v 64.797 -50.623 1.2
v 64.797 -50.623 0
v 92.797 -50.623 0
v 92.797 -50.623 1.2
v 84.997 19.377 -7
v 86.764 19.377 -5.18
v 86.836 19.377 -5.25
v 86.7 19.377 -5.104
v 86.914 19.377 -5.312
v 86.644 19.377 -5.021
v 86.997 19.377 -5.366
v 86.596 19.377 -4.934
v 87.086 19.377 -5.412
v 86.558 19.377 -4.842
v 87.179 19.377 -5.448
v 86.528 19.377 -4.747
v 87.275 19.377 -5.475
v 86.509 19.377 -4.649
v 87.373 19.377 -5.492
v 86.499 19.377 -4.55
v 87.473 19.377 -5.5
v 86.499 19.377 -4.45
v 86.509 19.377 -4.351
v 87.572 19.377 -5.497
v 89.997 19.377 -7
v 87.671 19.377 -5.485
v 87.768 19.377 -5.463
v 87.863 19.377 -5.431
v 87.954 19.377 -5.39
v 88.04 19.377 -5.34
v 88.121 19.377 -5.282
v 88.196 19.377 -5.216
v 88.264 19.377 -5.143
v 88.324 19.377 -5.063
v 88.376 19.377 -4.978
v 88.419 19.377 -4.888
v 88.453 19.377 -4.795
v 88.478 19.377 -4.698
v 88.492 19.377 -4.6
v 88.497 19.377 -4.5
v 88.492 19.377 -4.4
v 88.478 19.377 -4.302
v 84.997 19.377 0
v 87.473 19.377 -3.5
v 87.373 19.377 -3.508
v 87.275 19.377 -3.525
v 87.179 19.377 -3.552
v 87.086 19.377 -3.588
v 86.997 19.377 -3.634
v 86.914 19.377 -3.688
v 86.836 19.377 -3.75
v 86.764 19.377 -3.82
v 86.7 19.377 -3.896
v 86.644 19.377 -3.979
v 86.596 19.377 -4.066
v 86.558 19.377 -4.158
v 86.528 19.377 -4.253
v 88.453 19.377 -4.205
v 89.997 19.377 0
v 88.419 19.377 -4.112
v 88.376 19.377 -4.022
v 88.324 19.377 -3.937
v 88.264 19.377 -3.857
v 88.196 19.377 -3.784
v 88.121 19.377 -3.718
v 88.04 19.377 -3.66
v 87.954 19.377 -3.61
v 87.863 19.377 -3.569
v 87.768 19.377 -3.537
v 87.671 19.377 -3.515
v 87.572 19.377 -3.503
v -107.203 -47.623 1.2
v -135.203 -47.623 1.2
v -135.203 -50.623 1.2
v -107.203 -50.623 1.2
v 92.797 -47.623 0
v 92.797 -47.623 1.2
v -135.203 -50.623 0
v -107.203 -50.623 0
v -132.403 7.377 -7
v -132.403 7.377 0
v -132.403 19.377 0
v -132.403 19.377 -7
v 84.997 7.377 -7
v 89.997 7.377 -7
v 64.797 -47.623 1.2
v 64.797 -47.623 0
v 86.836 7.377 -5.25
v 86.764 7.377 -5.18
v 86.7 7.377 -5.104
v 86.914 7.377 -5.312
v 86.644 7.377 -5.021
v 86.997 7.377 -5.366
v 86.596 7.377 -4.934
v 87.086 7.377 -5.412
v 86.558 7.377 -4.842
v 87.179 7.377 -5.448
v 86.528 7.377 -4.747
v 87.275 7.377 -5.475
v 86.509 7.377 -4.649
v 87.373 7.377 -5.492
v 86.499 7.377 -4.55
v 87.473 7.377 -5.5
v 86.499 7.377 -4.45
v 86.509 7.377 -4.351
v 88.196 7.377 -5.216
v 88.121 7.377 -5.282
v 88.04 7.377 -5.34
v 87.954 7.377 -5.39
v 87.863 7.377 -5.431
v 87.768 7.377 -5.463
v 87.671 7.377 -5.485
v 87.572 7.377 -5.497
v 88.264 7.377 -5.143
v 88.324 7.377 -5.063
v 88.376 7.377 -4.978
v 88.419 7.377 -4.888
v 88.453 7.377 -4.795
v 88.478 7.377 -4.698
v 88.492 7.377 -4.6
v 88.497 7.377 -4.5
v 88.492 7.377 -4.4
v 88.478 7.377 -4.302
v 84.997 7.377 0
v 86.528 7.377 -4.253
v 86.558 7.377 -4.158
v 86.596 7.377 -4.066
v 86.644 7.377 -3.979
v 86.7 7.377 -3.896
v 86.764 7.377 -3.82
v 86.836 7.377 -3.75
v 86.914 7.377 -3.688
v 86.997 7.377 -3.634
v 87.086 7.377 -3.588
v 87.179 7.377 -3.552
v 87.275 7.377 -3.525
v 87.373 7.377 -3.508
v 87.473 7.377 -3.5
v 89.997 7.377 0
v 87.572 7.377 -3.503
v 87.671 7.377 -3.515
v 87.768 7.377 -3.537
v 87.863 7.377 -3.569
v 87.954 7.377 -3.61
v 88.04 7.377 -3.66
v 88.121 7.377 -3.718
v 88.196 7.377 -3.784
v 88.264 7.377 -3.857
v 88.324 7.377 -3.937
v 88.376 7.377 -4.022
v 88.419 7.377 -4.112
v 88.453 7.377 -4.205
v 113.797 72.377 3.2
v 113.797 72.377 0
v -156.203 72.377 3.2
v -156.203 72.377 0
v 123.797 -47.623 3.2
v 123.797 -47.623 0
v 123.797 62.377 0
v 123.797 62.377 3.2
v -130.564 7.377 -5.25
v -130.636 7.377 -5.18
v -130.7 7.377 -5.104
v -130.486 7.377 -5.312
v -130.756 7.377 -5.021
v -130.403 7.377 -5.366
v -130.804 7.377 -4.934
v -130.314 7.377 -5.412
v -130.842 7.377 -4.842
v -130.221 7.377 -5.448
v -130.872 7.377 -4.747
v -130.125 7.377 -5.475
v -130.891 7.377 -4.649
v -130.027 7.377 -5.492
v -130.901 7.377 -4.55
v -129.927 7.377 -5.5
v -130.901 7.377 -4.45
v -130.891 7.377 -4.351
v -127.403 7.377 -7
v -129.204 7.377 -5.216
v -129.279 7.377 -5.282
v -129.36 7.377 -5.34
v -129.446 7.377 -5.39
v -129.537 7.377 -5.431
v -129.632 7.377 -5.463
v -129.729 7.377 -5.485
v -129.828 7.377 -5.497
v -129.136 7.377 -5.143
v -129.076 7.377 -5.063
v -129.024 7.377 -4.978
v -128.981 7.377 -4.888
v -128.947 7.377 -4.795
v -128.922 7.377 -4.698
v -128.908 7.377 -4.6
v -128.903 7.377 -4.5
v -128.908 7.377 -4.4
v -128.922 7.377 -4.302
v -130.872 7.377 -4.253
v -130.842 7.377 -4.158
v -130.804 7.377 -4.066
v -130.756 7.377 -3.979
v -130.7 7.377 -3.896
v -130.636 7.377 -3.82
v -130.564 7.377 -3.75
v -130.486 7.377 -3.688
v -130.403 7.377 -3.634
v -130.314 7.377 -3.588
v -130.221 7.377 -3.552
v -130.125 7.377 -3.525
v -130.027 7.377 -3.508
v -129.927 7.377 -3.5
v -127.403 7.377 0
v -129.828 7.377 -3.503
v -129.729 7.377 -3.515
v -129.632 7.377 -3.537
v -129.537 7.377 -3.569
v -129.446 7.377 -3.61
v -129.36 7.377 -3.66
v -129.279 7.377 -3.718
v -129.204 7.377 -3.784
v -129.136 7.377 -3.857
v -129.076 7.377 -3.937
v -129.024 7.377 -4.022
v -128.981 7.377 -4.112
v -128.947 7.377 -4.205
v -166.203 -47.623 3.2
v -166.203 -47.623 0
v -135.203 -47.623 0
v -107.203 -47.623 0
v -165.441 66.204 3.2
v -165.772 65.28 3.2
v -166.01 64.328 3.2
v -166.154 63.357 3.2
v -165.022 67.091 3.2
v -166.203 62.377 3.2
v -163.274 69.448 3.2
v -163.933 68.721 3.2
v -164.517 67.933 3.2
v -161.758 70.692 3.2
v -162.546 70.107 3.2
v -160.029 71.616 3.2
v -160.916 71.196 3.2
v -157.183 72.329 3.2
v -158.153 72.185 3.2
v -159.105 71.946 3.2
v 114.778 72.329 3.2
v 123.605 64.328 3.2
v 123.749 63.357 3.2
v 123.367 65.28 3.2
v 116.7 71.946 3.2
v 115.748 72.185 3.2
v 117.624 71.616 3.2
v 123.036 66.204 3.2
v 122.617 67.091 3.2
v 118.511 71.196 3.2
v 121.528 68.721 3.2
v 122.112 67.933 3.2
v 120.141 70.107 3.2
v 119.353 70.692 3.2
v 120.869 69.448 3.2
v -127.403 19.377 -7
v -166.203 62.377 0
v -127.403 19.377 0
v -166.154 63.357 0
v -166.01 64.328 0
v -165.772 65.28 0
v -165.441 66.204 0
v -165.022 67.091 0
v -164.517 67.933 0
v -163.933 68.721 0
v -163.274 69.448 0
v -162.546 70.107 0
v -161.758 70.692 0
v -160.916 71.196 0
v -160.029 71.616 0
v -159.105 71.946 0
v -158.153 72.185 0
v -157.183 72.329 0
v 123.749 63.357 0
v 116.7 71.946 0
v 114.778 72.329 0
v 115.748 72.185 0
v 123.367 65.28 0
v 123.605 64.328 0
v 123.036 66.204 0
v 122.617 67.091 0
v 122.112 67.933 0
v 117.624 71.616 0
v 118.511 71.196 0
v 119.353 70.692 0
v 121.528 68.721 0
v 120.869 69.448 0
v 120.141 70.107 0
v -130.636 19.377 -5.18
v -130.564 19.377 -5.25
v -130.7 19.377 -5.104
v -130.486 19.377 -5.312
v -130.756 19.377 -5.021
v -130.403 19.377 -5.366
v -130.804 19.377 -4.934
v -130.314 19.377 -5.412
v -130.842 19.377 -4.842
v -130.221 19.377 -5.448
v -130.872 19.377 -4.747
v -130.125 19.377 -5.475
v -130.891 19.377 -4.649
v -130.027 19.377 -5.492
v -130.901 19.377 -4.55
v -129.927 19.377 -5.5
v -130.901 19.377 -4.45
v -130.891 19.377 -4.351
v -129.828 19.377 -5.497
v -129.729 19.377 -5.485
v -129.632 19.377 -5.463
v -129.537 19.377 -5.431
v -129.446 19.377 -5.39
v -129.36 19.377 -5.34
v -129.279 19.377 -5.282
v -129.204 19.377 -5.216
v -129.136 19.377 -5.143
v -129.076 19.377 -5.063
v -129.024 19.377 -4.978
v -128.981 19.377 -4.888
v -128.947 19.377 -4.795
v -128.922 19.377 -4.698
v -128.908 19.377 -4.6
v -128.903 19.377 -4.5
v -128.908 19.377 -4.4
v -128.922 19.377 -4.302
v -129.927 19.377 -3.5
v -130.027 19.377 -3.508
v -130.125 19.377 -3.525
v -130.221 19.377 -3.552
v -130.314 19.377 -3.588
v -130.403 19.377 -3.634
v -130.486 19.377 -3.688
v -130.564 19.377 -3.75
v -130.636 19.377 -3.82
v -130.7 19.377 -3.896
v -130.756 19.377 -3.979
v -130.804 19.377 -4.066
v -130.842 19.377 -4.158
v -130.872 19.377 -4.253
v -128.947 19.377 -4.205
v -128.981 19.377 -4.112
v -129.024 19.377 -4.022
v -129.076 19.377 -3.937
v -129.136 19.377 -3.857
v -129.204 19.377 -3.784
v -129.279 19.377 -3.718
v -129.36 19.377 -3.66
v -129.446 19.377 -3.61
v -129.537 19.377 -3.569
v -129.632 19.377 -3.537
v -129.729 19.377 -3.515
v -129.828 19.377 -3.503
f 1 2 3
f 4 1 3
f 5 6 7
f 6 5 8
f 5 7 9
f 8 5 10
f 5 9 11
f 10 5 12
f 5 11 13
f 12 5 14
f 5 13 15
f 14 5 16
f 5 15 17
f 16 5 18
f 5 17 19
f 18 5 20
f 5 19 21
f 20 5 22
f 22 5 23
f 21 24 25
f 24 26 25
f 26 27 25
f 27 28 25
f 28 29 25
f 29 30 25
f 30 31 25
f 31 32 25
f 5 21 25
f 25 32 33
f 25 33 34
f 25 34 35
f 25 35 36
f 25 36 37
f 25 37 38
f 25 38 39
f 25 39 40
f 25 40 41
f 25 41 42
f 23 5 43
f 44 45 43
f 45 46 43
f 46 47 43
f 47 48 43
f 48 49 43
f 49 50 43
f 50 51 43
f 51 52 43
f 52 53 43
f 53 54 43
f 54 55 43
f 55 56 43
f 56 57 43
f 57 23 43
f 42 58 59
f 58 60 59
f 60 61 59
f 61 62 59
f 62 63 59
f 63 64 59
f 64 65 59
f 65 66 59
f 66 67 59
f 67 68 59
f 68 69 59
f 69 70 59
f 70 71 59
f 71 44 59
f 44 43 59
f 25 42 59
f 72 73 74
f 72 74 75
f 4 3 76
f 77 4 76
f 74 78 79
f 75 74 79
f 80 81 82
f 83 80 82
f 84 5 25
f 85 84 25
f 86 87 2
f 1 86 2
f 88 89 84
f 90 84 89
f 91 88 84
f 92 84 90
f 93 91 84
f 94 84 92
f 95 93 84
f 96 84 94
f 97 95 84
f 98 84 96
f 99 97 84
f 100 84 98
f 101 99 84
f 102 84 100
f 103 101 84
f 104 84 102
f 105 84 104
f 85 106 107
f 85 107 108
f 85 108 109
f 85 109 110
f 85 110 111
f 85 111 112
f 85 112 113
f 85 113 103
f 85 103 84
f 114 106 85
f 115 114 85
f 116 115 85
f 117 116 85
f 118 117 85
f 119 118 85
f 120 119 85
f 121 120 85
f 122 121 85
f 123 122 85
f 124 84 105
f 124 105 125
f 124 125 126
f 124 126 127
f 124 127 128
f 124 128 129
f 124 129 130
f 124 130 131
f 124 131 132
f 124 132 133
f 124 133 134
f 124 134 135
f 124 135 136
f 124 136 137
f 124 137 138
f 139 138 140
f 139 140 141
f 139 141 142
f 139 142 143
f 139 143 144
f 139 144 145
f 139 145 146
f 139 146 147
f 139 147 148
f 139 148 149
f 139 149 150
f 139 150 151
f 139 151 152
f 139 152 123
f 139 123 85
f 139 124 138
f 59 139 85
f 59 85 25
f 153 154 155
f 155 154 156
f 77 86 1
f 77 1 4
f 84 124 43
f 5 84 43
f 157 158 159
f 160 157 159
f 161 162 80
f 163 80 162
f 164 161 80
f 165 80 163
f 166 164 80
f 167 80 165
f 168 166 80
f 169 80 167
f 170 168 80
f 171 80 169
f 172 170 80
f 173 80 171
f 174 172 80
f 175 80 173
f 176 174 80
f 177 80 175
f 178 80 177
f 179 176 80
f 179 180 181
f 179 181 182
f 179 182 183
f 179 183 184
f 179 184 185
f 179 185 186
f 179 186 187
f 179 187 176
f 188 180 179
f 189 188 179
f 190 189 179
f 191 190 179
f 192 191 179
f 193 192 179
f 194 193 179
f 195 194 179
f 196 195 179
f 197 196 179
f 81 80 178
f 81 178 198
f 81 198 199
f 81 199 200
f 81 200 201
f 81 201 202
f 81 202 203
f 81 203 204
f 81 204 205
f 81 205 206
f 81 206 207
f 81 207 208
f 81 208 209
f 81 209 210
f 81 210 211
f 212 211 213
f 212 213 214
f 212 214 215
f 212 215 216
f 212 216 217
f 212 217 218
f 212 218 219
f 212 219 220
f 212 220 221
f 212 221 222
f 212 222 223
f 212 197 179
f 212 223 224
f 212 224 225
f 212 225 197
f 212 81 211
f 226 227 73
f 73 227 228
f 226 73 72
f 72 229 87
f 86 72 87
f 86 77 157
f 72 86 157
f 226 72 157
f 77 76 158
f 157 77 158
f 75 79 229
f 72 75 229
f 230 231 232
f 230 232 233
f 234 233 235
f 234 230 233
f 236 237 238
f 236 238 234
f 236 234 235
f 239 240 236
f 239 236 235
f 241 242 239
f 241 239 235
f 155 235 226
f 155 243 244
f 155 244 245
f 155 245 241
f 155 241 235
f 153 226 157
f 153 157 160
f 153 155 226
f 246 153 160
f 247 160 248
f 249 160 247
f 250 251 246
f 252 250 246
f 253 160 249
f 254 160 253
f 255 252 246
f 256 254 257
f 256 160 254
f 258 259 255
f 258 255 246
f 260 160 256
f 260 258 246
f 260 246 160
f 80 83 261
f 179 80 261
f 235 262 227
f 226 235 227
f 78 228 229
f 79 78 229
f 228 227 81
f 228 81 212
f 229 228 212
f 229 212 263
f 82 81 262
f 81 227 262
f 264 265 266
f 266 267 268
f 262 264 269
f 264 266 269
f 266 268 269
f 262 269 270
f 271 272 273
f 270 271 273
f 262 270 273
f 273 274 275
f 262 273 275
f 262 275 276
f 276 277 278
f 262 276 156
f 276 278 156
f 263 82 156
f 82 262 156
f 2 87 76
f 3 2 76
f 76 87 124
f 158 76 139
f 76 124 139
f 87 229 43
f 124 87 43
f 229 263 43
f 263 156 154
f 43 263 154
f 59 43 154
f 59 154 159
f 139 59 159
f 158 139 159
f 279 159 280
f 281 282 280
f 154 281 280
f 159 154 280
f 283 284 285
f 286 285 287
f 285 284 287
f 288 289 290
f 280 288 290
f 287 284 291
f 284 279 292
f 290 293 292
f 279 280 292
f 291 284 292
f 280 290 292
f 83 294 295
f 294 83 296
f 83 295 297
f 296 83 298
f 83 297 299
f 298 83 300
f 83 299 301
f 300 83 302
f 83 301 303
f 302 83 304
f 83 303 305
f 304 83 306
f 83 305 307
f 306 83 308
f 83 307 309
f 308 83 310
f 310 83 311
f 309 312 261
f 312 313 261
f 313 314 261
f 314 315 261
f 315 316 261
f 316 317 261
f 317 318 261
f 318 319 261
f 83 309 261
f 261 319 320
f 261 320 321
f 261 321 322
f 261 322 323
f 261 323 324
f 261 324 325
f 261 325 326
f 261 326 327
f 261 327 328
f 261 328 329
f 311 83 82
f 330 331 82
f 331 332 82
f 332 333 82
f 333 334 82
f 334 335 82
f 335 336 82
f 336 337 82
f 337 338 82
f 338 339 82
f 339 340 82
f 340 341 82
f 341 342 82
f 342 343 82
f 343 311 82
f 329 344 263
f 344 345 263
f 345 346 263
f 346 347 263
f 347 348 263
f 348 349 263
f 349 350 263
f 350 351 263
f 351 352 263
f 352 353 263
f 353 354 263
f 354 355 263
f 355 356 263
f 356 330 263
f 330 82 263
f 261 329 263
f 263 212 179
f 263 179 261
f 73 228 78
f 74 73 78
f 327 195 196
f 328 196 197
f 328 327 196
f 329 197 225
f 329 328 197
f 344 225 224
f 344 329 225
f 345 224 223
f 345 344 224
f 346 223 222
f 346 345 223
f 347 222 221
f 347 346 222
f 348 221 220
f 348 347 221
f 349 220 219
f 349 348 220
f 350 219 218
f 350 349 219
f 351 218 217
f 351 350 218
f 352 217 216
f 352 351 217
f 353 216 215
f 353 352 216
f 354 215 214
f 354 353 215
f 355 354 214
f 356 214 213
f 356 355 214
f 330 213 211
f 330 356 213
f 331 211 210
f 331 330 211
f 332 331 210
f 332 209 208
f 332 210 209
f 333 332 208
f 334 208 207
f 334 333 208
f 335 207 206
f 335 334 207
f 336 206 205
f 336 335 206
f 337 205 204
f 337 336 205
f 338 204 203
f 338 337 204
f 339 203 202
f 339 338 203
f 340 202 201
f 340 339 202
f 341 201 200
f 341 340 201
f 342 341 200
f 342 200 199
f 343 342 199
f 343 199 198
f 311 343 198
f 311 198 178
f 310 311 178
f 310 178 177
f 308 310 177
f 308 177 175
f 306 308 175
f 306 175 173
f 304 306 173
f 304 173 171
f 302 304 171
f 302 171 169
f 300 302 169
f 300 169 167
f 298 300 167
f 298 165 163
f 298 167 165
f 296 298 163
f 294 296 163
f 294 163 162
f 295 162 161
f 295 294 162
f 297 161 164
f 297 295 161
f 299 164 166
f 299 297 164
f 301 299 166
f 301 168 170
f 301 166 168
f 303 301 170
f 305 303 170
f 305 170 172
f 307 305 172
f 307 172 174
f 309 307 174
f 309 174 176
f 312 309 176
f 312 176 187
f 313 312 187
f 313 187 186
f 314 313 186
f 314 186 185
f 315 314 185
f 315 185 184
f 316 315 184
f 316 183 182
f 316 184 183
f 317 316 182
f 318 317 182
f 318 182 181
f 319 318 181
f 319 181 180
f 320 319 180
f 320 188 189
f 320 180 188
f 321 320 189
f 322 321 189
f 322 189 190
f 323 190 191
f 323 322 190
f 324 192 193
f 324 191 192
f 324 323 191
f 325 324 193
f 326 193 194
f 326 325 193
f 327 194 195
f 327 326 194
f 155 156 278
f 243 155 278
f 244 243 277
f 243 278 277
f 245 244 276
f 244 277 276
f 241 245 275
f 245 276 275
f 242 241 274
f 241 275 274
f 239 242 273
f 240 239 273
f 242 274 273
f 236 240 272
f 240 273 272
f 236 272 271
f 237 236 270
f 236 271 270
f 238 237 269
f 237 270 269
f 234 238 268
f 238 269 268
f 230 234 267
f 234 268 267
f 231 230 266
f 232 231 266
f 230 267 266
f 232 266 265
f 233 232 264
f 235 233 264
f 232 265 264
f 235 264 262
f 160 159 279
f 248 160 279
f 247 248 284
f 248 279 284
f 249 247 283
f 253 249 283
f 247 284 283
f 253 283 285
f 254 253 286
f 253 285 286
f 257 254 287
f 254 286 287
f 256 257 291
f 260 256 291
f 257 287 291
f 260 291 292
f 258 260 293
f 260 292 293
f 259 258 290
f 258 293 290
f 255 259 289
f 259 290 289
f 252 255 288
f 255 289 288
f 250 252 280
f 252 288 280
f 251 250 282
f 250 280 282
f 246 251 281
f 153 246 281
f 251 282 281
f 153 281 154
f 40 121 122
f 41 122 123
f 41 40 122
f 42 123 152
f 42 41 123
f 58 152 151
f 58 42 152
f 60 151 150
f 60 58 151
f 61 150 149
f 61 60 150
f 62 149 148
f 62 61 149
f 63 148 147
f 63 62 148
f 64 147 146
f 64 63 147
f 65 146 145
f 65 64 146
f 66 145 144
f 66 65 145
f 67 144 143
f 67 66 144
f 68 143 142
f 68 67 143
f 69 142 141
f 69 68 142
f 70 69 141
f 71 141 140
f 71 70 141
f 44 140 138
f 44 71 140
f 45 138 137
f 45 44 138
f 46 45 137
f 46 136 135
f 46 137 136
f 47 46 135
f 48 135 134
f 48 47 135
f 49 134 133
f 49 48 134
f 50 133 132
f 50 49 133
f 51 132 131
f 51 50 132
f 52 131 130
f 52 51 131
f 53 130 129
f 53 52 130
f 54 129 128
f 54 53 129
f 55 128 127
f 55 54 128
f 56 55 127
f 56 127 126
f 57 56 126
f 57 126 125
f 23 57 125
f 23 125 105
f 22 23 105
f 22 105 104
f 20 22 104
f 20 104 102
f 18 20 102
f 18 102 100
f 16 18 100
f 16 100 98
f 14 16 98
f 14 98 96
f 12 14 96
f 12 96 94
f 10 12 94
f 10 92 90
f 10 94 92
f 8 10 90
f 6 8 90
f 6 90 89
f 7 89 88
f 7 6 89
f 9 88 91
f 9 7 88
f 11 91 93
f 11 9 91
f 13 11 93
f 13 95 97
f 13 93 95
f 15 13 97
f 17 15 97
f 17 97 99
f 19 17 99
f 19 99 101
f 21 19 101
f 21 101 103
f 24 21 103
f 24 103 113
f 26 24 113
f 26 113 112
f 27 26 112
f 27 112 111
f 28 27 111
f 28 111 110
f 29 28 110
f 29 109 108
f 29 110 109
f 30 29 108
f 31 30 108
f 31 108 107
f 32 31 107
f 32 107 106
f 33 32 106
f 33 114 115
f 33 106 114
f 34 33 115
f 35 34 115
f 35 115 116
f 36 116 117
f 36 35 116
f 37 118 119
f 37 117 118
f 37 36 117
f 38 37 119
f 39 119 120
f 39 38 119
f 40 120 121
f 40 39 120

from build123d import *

# Parameters (mm, degrees)
EXTRUDE_1_DEPTH     = 3.2
SKETCH_2_W          = 28
SKETCH_2_H          = 3
CUT_EXTRUDE_1_DEPTH = 2
SKETCH_3_W          = 5
SKETCH_3_H          = 12
EXTRUDE_2_DEPTH     = 7
SKETCH_4_R          = 1
CUT_EXTRUDE_2_DEPTH = 243.070789578


with BuildPart() as part:
    # 草图1 → 凸台-拉伸1 (new body)
    with BuildSketch(Plane.XY):
        with BuildLine():
            Line((-107.202531646, -47.623114492), (64.797468354, -47.623114492))
            Line((64.797468354, -47.623114492), (64.797468354, -50.623114492))
            Line((64.797468354, -50.623114492), (92.797468354, -50.623114492))
            Line((92.797468354, -50.623114492), (92.797468354, -47.623114492))
            Line((92.797468354, -47.623114492), (123.797468354, -47.623114492))
            Line((123.797468354, -47.623114492), (123.797468354, 62.376885508))
            ThreePointArc((123.797468354, 62.376885508), (120.868536166, 69.447953319), (113.797468354, 72.376885508))
            Line((113.797468354, 72.376885508), (-156.202531646, 72.376885508))
            ThreePointArc((-156.202531646, 72.376885508), (-163.273599457, 69.447953319), (-166.202531646, 62.376885508))
            Line((-166.202531646, 62.376885508), (-166.202531646, -47.623114492))
            Line((-166.202531646, -47.623114492), (-135.202531646, -47.623114492))
            Line((-135.202531646, -47.623114492), (-135.202531646, -50.623114492))
            Line((-135.202531646, -50.623114492), (-107.202531646, -50.623114492))
            Line((-107.202531646, -50.623114492), (-107.202531646, -47.623114492))
        make_face()
    extrude(amount=EXTRUDE_1_DEPTH)

    # 草图2 → 切除-拉伸1 (cut)
    with BuildSketch(Plane.XY.offset(3.2)):
        with Locations((-121.202531646, -49.123114492)):
            Rectangle(SKETCH_2_W, SKETCH_2_H)
        with Locations((78.797468354, -49.123114492)):
            Rectangle(SKETCH_2_W, SKETCH_2_H)
    extrude(amount=-CUT_EXTRUDE_1_DEPTH, mode=Mode.SUBTRACT)

    # 草图3 → 凸台-拉伸2 (add)
    with BuildSketch(Plane.XY):
        with Locations((-129.902531646, 13.376885508)):
            Rectangle(SKETCH_3_W, SKETCH_3_H)
        with Locations((87.497468354, 13.376885508)):
            Rectangle(SKETCH_3_W, SKETCH_3_H)
    extrude(amount=-EXTRUDE_2_DEPTH)

    # 草图4 → 切除-拉伸2 (cut, through all)
    with BuildSketch(Plane(origin=(65.420582847, 19.376885508, 0), x_dir=(0, 0, -1), z_dir=(0, -1, 0))):
        with Locations(Location((4.5, -195.323114492, 0), (0, 0, 90))):
            Circle(SKETCH_4_R)
        with Locations(Location((4.5, 22.076885508, 0), (0, 0, 90))):
            Circle(SKETCH_4_R)
    extrude(amount=CUT_EXTRUDE_2_DEPTH, mode=Mode.SUBTRACT)


solid = part.part
